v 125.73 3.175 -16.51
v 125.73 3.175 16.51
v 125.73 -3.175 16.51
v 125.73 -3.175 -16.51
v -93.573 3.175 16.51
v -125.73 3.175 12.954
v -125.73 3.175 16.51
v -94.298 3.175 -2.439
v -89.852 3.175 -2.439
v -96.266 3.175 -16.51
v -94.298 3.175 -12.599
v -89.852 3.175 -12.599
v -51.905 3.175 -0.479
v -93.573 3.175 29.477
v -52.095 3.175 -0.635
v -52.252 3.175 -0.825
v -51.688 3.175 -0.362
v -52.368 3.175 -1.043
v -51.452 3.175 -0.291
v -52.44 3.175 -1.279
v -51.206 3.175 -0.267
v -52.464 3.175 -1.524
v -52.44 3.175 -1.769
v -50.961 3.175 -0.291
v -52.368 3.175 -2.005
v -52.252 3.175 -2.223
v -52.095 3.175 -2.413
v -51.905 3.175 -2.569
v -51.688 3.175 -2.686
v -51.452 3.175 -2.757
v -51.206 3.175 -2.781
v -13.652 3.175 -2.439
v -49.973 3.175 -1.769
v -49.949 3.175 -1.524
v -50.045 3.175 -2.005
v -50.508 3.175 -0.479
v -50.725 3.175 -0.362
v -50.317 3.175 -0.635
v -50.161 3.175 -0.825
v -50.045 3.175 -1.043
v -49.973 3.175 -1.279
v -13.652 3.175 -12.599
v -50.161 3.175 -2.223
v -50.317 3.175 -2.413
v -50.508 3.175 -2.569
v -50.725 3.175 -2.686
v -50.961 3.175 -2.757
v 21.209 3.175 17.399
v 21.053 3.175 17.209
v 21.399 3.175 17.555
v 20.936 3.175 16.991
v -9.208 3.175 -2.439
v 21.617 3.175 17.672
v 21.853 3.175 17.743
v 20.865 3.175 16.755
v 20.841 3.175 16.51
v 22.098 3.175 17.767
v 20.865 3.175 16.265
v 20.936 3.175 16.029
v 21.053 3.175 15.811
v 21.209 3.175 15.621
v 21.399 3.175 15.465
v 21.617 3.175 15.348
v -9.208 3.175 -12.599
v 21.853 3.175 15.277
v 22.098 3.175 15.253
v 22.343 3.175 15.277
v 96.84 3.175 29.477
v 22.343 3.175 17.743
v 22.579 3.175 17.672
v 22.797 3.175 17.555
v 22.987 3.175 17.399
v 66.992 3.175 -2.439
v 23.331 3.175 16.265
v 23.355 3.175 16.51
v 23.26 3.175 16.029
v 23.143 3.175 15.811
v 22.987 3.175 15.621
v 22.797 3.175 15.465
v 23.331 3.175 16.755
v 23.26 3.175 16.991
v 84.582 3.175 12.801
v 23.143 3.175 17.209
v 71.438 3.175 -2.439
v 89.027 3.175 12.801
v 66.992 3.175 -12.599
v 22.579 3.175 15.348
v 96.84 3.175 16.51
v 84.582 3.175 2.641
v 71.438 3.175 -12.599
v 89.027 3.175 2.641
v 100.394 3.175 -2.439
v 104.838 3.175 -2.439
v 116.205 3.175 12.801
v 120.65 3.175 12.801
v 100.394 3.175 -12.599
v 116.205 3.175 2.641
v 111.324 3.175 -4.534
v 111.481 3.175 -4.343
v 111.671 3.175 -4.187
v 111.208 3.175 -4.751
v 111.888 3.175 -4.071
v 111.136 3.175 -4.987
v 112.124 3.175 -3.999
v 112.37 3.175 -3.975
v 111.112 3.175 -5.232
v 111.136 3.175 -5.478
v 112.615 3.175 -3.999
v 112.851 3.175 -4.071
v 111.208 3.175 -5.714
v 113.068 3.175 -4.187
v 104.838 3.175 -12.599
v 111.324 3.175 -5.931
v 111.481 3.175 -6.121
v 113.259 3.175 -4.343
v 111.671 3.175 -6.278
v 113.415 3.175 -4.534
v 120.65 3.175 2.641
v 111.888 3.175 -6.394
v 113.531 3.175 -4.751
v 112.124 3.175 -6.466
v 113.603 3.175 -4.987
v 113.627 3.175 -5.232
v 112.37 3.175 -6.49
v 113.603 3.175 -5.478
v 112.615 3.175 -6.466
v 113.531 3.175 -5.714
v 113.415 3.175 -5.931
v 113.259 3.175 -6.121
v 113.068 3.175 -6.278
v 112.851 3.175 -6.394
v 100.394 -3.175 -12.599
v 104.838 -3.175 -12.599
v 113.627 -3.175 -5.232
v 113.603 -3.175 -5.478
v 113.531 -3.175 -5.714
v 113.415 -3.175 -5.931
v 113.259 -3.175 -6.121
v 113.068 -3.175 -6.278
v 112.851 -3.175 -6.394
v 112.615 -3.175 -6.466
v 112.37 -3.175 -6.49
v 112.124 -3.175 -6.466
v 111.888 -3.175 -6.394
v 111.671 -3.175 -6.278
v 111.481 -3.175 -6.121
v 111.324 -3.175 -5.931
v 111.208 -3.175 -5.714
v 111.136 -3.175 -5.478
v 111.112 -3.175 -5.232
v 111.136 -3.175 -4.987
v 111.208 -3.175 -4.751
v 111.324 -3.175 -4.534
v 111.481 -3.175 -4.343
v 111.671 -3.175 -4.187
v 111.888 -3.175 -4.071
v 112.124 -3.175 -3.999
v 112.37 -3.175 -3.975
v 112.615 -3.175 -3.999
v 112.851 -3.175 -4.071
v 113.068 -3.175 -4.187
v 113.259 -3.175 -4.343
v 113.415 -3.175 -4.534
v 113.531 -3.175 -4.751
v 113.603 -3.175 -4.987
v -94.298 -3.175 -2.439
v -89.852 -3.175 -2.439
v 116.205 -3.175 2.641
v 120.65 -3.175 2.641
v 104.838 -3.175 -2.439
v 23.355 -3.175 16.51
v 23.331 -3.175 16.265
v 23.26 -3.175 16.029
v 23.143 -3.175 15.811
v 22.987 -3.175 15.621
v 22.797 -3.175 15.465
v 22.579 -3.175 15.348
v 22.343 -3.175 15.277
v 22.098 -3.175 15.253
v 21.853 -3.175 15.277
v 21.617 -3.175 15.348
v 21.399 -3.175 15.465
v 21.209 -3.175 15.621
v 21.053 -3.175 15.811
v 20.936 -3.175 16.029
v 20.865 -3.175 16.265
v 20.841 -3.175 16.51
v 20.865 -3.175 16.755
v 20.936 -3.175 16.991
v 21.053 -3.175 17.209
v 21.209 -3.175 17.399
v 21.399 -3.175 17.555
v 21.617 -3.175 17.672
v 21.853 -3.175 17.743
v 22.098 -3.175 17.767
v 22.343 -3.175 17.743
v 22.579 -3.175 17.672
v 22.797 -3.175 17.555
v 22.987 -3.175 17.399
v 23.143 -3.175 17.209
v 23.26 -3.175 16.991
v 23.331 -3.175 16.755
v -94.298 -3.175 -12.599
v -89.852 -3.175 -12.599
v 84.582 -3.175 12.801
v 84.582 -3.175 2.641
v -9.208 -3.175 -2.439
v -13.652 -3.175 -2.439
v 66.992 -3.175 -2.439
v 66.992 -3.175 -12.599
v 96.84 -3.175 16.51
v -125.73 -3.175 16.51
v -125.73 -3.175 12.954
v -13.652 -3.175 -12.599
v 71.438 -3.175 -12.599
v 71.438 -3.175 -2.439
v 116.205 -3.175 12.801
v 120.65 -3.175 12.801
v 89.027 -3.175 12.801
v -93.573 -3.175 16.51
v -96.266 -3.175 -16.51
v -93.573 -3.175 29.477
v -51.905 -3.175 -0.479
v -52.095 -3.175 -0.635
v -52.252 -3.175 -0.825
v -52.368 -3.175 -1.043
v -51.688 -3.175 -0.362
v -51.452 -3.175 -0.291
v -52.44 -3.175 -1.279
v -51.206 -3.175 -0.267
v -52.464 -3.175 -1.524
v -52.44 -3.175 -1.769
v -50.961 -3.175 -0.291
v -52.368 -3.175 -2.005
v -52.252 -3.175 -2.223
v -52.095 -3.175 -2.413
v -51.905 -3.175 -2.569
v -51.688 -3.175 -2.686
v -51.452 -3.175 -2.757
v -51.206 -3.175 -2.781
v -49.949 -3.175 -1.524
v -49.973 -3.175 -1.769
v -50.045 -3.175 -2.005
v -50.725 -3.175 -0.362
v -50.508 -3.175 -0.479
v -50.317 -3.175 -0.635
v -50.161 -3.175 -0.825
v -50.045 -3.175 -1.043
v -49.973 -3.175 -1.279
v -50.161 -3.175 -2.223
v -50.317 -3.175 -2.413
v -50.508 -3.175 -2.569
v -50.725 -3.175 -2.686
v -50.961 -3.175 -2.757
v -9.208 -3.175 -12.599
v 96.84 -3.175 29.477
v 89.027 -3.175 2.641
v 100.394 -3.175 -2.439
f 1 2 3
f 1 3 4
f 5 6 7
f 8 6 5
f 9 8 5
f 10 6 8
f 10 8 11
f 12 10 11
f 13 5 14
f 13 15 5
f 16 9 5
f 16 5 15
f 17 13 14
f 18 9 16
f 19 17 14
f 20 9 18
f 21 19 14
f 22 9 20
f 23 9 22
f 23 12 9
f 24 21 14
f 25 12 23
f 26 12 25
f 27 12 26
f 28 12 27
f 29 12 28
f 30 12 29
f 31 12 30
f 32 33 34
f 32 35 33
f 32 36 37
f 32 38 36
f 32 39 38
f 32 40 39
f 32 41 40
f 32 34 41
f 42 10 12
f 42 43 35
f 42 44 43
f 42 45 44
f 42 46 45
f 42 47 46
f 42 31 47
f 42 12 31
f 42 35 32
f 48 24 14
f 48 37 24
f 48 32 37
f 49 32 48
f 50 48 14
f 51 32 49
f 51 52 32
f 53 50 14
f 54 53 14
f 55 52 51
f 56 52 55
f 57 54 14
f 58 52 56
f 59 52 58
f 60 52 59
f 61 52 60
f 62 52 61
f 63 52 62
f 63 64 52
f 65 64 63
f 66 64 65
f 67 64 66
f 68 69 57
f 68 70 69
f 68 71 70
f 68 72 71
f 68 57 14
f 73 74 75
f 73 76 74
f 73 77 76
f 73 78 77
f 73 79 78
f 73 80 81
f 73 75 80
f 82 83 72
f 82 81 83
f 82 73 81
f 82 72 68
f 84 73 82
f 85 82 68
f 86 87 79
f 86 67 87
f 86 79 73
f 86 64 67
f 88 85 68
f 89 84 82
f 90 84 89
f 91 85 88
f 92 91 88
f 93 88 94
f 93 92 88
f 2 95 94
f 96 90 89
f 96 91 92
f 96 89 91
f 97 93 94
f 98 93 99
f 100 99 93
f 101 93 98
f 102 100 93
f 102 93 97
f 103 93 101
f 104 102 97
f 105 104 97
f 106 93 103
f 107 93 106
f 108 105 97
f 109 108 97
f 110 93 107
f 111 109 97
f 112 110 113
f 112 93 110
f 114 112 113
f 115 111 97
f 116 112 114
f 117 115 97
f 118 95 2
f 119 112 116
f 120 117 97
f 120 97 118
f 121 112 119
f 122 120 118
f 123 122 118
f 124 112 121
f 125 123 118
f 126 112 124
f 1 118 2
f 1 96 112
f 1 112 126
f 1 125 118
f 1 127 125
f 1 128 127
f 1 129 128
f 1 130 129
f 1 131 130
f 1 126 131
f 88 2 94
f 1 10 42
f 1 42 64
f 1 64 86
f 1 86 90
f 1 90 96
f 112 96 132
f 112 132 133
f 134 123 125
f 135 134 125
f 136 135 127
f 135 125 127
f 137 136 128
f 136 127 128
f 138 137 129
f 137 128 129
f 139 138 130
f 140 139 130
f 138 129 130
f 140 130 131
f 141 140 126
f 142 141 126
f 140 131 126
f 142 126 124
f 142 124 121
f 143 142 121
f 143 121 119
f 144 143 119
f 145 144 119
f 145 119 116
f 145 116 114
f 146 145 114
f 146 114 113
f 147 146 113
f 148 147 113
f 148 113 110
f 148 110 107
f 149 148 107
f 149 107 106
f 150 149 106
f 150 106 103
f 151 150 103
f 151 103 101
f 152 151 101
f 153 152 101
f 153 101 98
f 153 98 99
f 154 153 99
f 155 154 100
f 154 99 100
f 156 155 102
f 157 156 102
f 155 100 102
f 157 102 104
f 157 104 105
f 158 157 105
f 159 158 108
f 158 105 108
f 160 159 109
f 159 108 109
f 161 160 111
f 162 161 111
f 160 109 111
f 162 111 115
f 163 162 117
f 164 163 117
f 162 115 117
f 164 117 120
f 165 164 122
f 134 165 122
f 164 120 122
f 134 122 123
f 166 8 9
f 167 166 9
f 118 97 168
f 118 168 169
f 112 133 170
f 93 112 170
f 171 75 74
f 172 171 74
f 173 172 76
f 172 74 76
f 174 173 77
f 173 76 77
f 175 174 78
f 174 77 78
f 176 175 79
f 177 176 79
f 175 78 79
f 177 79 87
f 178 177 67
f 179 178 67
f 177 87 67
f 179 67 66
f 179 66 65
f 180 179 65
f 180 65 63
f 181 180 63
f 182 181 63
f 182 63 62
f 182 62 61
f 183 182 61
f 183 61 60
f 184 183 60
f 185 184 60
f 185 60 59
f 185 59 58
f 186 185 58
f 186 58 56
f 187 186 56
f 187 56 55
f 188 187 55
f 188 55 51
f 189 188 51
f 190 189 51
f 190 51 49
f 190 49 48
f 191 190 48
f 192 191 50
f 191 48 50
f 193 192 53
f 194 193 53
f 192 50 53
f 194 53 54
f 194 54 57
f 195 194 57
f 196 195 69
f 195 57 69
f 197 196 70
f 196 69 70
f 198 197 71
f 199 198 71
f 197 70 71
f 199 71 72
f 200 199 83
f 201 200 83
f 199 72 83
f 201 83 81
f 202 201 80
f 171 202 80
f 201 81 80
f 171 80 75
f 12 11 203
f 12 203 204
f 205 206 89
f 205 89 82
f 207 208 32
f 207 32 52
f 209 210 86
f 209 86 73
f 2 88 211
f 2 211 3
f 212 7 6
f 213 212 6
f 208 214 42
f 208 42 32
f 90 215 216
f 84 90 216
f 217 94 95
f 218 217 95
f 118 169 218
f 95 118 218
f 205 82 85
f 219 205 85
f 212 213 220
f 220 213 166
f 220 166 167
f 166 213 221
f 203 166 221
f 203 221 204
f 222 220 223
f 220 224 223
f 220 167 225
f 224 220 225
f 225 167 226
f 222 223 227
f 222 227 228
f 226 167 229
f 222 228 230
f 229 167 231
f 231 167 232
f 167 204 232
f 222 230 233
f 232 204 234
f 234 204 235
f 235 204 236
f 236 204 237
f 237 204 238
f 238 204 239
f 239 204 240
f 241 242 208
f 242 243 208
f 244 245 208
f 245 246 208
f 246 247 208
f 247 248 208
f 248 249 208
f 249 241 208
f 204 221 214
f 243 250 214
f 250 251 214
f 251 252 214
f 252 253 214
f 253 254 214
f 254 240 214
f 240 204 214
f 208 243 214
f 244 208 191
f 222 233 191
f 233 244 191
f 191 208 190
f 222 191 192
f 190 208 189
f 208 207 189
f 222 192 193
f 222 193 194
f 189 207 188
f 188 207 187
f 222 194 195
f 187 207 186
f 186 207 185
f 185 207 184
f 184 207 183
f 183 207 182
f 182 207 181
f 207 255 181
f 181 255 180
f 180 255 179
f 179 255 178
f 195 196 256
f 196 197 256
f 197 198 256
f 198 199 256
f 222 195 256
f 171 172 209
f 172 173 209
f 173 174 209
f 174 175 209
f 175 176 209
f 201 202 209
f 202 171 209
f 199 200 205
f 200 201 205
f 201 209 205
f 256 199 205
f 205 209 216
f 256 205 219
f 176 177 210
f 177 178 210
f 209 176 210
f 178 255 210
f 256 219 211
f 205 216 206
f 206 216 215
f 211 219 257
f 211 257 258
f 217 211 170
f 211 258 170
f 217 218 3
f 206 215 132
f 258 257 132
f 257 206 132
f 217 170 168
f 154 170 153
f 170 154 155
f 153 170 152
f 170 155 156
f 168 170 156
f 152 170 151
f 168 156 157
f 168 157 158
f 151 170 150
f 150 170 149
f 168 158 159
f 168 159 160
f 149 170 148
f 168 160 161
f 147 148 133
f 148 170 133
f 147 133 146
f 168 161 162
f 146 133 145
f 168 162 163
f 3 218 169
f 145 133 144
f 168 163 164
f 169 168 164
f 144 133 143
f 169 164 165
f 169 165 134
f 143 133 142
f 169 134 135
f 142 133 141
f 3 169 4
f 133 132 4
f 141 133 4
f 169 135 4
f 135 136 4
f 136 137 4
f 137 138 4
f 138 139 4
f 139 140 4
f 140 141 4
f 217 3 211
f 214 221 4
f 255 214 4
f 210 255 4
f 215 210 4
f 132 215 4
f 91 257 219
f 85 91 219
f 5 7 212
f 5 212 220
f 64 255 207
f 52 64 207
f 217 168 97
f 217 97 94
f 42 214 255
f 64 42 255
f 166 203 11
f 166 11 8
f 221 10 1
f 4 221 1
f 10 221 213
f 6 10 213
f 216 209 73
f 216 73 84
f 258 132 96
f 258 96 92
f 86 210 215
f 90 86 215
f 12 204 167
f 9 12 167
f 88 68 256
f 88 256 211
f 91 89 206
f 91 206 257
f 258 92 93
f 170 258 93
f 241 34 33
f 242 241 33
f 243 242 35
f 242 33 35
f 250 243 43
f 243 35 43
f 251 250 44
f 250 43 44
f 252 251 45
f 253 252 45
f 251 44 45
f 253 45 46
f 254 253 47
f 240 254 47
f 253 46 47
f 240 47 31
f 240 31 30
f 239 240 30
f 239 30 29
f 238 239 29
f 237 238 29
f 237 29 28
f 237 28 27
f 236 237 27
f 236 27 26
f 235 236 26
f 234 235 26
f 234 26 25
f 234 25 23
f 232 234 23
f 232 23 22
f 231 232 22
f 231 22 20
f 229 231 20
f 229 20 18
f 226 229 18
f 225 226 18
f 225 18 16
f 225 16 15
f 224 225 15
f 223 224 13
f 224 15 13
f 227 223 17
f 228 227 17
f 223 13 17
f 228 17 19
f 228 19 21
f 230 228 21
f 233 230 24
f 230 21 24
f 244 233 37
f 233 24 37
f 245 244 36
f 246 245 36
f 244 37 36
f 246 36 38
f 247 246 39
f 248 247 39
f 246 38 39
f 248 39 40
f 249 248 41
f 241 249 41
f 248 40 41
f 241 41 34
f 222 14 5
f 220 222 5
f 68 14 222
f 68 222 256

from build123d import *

# Parameters (mm, degrees)
SKETCH1_W           = 251.46
SKETCH1_H           = 33.02
BOSS_EXTRUDE1_DEPTH = 3.175
CUT_EXTRUDE1_DEPTH  = 7.35
SKETCH3_W           = 190.412642411
SKETCH3_H           = 12.967021693
BOSS_EXTRUDE2_DEPTH = 6.35
SKETCH5_R           = 1.2573
CUT_EXTRUDE2_DEPTH  = 7.35
SKETCH6_W           = 4.445
SKETCH6_H           = 10.16
CUT_EXTRUDE4_DEPTH  = 7.35


with BuildPart() as part:
    # Sketch1 → Boss-Extrude1 (new body, symmetric)
    with BuildSketch(Plane(origin=(0, 0, 0), x_dir=(1, 0, 0), z_dir=(0, 1, 0))):
        Rectangle(SKETCH1_W, SKETCH1_H)
    extrude(amount=BOSS_EXTRUDE1_DEPTH, both=True)

    # Sketch2 → Cut-Extrude1 (cut, through all)
    with BuildSketch(Plane.XZ.offset(3.175)):
        Polygon((-96.266, -16.51), (-125.73, 12.954), (-125.73, -16.51), align=None)
    extrude(amount=-CUT_EXTRUDE1_DEPTH, mode=Mode.SUBTRACT)

    # Sketch3 → Boss-Extrude2 (add)
    with BuildSketch(Plane(origin=(0, 3.175, 0), x_dir=(1, 0, 0), z_dir=(0, 1, 0))):
        with Locations((1.633403272, -22.993510847)):
            Rectangle(SKETCH3_W, SKETCH3_H)
    extrude(amount=-BOSS_EXTRUDE2_DEPTH)

    # Sketch5 → Cut-Extrude2 (cut, through all)
    with BuildSketch(Plane(origin=(0, 3.175, 0), x_dir=(1, 0, 0), z_dir=(0, 1, 0))):
        with Locations((112.3696, 5.2324)):
            Circle(SKETCH5_R)
        with Locations((22.098, -16.51)):
            Circle(SKETCH5_R)
        with Locations((-51.2064, 1.524)):
            Circle(SKETCH5_R)
    extrude(amount=-CUT_EXTRUDE2_DEPTH, mode=Mode.SUBTRACT)

    # Sketch6 → Cut-Extrude4 (cut, through all)
    with BuildSketch(Plane.XZ.offset(3.175)):
        with Locations((86.8045, 7.721036343)):
            Rectangle(SKETCH6_W, SKETCH6_H)
        with Locations((118.4275, 7.721036343)):
            Rectangle(SKETCH6_W, SKETCH6_H)
        with Locations((102.616, -7.518963657)):
            Rectangle(SKETCH6_W, SKETCH6_H)
        with Locations((69.215, -7.518963657)):
            Rectangle(SKETCH6_W, SKETCH6_H)
        with Locations((-11.43, -7.518963657)):
            Rectangle(SKETCH6_W, SKETCH6_H)
        with Locations((-92.075, -7.518963657)):
            Rectangle(SKETCH6_W, SKETCH6_H)
    extrude(amount=-CUT_EXTRUDE4_DEPTH, mode=Mode.SUBTRACT)


solid = part.part
